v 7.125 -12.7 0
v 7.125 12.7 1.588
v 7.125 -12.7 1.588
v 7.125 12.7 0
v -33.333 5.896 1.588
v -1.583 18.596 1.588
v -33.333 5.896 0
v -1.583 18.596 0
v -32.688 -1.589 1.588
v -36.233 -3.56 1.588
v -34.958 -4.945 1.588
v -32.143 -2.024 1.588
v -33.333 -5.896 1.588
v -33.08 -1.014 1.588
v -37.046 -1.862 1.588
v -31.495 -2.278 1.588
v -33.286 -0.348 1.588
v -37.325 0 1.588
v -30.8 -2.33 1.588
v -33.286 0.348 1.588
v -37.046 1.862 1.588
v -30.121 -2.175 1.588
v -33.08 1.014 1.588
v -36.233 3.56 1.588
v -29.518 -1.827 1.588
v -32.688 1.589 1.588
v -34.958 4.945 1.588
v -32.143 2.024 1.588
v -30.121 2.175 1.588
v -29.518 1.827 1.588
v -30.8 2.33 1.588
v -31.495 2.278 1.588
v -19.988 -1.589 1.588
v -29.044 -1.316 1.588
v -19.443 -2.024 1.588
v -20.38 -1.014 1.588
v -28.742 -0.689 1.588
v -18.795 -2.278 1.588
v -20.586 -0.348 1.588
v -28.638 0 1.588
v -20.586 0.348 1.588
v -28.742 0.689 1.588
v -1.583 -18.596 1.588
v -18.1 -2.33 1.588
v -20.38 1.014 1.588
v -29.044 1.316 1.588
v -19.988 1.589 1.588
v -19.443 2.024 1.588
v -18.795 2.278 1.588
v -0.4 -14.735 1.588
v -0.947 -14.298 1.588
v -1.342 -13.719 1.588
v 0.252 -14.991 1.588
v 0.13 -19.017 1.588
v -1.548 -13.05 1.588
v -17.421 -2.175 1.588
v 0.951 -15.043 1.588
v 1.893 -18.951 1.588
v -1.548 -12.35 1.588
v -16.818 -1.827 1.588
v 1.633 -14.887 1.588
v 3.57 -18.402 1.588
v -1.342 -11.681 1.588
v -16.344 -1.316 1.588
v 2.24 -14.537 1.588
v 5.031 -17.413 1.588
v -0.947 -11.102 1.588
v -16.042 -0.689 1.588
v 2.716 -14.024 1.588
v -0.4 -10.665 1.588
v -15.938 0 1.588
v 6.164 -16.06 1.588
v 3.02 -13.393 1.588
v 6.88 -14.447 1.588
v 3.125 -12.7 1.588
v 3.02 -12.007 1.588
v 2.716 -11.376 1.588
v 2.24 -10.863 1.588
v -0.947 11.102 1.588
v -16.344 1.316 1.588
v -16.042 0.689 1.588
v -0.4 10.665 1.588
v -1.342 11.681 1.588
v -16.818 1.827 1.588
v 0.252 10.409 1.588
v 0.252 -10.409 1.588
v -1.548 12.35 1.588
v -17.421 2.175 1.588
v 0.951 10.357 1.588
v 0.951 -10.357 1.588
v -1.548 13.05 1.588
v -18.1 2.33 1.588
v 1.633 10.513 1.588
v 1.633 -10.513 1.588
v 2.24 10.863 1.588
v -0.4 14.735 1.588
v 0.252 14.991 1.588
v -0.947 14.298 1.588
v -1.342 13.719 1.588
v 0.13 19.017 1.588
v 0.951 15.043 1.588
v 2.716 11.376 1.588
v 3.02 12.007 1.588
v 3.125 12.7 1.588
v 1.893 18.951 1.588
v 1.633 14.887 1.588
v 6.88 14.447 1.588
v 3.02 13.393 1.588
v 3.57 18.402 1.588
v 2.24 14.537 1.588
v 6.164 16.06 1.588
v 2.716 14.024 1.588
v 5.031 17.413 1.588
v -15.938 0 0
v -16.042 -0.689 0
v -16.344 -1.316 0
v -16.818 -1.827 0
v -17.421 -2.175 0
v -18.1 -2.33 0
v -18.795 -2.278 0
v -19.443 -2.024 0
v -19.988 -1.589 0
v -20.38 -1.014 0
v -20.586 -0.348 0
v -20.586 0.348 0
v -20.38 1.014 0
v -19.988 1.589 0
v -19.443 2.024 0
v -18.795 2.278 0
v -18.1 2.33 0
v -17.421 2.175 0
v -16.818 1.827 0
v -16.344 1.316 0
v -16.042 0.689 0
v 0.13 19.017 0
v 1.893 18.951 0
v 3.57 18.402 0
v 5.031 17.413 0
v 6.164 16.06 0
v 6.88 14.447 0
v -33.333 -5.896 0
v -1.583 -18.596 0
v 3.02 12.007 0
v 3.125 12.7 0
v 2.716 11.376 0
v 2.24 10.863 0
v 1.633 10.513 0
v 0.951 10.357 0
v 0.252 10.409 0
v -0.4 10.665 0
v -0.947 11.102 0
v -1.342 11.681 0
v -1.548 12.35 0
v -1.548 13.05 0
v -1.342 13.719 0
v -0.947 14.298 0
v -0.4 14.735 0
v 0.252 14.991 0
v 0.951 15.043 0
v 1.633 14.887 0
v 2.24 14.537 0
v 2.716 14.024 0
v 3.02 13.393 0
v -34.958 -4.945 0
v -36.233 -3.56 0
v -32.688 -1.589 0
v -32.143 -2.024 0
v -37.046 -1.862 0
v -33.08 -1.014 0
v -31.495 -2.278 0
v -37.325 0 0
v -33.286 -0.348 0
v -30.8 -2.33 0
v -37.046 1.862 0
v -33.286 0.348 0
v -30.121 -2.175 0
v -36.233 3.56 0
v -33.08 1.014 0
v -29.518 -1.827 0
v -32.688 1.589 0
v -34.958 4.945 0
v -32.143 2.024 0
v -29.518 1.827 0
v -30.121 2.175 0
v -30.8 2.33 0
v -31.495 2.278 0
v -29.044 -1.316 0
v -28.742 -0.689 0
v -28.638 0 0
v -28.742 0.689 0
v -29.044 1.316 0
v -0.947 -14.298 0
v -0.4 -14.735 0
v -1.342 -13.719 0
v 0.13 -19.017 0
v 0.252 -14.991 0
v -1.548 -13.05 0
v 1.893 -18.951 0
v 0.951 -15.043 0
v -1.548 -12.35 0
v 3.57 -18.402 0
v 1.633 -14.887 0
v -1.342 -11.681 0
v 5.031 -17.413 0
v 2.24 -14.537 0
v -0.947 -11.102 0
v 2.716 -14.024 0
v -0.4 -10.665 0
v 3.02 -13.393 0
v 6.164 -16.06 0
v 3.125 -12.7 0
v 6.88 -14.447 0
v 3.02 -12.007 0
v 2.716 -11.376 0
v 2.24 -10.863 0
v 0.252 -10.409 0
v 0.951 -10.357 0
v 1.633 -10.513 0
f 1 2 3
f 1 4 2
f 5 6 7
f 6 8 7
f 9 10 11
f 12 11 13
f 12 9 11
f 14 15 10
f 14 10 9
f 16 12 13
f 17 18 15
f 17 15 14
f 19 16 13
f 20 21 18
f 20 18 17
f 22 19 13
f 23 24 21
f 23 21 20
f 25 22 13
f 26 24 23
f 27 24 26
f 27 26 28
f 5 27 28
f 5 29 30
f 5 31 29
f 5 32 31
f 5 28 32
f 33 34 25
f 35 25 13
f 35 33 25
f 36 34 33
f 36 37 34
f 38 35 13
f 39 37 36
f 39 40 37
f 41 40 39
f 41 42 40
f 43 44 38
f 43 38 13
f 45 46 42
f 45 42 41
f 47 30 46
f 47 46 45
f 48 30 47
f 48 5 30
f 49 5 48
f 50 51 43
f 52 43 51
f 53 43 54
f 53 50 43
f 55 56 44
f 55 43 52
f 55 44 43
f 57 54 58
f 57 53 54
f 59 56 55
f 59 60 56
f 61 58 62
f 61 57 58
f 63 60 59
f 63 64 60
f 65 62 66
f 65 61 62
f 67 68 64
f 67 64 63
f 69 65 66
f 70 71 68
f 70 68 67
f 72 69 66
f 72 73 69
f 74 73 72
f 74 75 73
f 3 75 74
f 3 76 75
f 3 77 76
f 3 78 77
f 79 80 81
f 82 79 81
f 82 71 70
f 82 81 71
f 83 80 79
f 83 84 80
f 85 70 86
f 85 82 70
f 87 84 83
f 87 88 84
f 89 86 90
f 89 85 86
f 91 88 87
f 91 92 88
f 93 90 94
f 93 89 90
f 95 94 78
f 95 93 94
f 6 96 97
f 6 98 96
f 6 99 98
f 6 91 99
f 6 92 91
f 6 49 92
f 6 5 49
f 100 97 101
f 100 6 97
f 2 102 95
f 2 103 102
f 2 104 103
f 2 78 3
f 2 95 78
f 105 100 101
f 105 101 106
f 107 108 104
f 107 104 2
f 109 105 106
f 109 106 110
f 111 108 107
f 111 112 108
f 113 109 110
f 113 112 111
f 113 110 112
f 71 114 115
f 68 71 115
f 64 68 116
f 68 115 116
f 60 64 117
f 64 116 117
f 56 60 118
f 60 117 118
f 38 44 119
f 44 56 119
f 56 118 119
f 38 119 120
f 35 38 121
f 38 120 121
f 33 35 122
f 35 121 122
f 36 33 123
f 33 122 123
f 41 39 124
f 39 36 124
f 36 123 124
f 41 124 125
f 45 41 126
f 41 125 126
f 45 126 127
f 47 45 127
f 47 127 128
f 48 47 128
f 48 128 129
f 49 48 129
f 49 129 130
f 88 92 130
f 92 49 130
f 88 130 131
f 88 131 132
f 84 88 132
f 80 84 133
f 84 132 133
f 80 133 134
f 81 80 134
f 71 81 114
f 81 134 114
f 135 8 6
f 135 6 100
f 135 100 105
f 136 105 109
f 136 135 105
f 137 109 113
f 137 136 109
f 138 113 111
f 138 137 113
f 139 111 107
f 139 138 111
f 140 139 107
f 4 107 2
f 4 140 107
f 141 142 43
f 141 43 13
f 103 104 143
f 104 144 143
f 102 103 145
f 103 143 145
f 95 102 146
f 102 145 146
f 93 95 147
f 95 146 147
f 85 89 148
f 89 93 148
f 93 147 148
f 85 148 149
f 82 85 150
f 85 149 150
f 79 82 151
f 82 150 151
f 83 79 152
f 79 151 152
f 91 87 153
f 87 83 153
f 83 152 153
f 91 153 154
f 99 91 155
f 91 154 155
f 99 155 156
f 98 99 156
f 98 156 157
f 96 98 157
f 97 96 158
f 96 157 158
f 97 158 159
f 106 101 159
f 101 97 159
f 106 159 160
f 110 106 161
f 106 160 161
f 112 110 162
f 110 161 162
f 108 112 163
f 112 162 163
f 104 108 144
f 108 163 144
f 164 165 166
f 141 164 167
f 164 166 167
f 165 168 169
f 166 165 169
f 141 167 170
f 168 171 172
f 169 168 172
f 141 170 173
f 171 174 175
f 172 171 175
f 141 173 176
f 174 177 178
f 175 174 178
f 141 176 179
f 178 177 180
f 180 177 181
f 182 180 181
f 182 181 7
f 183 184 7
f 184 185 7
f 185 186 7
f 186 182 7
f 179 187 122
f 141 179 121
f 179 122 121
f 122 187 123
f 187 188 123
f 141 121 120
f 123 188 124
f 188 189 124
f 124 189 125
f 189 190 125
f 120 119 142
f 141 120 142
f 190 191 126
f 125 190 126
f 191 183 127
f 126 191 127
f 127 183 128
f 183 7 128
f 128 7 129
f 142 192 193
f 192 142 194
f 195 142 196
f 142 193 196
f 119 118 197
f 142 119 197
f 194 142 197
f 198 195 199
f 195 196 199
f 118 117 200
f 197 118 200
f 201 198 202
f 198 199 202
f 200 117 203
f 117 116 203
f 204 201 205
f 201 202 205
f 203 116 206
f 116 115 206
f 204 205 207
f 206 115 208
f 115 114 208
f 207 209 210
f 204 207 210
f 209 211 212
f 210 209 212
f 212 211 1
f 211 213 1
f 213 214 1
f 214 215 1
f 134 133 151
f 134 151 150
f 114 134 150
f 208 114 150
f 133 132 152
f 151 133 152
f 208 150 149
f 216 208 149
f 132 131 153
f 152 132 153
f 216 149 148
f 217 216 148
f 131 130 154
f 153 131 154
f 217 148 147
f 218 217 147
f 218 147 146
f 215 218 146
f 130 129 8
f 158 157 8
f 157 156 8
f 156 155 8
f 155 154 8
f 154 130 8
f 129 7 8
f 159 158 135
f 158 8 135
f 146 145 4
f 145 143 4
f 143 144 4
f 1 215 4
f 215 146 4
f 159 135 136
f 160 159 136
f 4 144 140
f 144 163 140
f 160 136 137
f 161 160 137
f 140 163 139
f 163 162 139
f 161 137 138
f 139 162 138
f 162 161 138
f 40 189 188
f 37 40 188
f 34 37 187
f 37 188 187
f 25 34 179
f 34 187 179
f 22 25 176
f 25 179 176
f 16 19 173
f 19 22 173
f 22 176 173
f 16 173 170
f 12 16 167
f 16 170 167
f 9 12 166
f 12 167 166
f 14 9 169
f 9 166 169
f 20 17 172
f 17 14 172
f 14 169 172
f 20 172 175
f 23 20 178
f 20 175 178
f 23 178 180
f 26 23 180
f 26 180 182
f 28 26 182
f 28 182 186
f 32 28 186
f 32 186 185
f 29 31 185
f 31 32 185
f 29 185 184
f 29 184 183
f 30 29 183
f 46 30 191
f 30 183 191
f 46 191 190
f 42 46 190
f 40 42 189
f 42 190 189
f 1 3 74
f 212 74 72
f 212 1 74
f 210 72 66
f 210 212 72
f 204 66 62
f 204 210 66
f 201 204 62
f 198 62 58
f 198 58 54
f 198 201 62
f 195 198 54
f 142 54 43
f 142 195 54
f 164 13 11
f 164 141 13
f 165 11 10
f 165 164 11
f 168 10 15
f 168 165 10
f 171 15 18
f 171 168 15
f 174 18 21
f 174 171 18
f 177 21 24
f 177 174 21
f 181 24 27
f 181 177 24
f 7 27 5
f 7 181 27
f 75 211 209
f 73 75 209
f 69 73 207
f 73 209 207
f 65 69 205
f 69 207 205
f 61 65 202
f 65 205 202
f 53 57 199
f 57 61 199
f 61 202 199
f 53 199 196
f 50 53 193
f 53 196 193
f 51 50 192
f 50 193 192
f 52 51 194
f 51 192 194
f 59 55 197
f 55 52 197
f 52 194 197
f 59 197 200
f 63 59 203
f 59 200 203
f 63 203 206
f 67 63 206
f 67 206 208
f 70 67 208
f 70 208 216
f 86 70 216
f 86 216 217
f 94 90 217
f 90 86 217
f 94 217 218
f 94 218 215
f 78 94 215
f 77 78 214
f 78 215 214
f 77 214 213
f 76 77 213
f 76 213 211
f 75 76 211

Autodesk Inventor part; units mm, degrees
ref_plane "YZ Plane" through (0, 0, 0) normal (1, 0, 0) x (0, 1, 0)
ref_plane "XZ Plane" through (0, 0, 0) normal (0, 1, 0) x (-1, 0, 0)
ref_plane "XY Plane" through (0, 0, 0) normal (0, 0, 1) x (1, 0, 0)
sketch "Sketch1" plane through (0, 0, 0) normal (0, 0, 1) x (1, 0, 0)
  circle A0 centre (0.7751, 12.7) radius 2.1844 construction
  circle A1 centre (0.7751, -12.7) radius 2.1844 construction
  circle A2 centre (0.7751, 12.7) radius 2.3495
  circle A3 centre (0.7751, -12.7) radius 2.3495
  circle A4 centre (-18.2749, 0) radius 2.3368
  circle A5 centre (-30.9749, 0) radius 2.3368
  circle A6 centre (-30.9749, 0) radius 6.35
  circle A7 centre (0.7751, -12.7) radius 6.35
  circle A8 centre (0.7751, 12.7) radius 6.35
  line L0 (7.1251, 12.7) -> (7.1251, -12.7)
  line L1 (-1.5832, -18.5958) -> (-33.3332, -5.8958)
  line L2 (-1.5832, 18.5958) -> (-33.3332, 5.8958)
  point P0 (0, 0)
  dimension "d0" = 4.699
  dimension "d1" = 4.699
  dimension "d2" = 4.6736
  dimension "d3" = 4.6736
  dimension "d4" = 12.7
  dimension "d5" = 19.05
  dimension "d6" = 12.7
  dimension "d7" = 12.7
  dimension "d8" = 12.7
extrude "Plate1" add sketch "Sketch1" along normal blind 1.5875 contours A6 | A6 L2 A8 L0 A7 L1
sheet face with bend "Face2" sketch "Sketch1" thickness 1.5875 toward (0, 0, 1) bend radius 1.5875 contours A8 | A7
bend "Bend1"
equation "\"d9\" = Thickness"
equation "\"d10\" = BendRadius"
equation "\"d11\" = BendReliefWidth"
equation "\"d13\" = MinimumRemnant"
equation "\"d12\" = BendReliefDepth"
equation "\"d14\" = TransitionRadius"
equation "\"BendRadius\" = Thickness"
equation "\"BendReliefWidth\" = Thickness"
equation "\"BendReliefDepth\" = 0.5 * Thickness"
equation "\"CornerReliefSize\" = 4 * Thickness"
equation "\"MinimumRemnant\" = 2 * Thickness"
equation "\"TransitionRadius\" = BendRadius"
equation "\"JacobiRadiusSize\" = BendRadius"
equation "\"GapSize\" = Thickness"
equation "\"Thickness\" = 1.5875"
properties part number "imuMount"
